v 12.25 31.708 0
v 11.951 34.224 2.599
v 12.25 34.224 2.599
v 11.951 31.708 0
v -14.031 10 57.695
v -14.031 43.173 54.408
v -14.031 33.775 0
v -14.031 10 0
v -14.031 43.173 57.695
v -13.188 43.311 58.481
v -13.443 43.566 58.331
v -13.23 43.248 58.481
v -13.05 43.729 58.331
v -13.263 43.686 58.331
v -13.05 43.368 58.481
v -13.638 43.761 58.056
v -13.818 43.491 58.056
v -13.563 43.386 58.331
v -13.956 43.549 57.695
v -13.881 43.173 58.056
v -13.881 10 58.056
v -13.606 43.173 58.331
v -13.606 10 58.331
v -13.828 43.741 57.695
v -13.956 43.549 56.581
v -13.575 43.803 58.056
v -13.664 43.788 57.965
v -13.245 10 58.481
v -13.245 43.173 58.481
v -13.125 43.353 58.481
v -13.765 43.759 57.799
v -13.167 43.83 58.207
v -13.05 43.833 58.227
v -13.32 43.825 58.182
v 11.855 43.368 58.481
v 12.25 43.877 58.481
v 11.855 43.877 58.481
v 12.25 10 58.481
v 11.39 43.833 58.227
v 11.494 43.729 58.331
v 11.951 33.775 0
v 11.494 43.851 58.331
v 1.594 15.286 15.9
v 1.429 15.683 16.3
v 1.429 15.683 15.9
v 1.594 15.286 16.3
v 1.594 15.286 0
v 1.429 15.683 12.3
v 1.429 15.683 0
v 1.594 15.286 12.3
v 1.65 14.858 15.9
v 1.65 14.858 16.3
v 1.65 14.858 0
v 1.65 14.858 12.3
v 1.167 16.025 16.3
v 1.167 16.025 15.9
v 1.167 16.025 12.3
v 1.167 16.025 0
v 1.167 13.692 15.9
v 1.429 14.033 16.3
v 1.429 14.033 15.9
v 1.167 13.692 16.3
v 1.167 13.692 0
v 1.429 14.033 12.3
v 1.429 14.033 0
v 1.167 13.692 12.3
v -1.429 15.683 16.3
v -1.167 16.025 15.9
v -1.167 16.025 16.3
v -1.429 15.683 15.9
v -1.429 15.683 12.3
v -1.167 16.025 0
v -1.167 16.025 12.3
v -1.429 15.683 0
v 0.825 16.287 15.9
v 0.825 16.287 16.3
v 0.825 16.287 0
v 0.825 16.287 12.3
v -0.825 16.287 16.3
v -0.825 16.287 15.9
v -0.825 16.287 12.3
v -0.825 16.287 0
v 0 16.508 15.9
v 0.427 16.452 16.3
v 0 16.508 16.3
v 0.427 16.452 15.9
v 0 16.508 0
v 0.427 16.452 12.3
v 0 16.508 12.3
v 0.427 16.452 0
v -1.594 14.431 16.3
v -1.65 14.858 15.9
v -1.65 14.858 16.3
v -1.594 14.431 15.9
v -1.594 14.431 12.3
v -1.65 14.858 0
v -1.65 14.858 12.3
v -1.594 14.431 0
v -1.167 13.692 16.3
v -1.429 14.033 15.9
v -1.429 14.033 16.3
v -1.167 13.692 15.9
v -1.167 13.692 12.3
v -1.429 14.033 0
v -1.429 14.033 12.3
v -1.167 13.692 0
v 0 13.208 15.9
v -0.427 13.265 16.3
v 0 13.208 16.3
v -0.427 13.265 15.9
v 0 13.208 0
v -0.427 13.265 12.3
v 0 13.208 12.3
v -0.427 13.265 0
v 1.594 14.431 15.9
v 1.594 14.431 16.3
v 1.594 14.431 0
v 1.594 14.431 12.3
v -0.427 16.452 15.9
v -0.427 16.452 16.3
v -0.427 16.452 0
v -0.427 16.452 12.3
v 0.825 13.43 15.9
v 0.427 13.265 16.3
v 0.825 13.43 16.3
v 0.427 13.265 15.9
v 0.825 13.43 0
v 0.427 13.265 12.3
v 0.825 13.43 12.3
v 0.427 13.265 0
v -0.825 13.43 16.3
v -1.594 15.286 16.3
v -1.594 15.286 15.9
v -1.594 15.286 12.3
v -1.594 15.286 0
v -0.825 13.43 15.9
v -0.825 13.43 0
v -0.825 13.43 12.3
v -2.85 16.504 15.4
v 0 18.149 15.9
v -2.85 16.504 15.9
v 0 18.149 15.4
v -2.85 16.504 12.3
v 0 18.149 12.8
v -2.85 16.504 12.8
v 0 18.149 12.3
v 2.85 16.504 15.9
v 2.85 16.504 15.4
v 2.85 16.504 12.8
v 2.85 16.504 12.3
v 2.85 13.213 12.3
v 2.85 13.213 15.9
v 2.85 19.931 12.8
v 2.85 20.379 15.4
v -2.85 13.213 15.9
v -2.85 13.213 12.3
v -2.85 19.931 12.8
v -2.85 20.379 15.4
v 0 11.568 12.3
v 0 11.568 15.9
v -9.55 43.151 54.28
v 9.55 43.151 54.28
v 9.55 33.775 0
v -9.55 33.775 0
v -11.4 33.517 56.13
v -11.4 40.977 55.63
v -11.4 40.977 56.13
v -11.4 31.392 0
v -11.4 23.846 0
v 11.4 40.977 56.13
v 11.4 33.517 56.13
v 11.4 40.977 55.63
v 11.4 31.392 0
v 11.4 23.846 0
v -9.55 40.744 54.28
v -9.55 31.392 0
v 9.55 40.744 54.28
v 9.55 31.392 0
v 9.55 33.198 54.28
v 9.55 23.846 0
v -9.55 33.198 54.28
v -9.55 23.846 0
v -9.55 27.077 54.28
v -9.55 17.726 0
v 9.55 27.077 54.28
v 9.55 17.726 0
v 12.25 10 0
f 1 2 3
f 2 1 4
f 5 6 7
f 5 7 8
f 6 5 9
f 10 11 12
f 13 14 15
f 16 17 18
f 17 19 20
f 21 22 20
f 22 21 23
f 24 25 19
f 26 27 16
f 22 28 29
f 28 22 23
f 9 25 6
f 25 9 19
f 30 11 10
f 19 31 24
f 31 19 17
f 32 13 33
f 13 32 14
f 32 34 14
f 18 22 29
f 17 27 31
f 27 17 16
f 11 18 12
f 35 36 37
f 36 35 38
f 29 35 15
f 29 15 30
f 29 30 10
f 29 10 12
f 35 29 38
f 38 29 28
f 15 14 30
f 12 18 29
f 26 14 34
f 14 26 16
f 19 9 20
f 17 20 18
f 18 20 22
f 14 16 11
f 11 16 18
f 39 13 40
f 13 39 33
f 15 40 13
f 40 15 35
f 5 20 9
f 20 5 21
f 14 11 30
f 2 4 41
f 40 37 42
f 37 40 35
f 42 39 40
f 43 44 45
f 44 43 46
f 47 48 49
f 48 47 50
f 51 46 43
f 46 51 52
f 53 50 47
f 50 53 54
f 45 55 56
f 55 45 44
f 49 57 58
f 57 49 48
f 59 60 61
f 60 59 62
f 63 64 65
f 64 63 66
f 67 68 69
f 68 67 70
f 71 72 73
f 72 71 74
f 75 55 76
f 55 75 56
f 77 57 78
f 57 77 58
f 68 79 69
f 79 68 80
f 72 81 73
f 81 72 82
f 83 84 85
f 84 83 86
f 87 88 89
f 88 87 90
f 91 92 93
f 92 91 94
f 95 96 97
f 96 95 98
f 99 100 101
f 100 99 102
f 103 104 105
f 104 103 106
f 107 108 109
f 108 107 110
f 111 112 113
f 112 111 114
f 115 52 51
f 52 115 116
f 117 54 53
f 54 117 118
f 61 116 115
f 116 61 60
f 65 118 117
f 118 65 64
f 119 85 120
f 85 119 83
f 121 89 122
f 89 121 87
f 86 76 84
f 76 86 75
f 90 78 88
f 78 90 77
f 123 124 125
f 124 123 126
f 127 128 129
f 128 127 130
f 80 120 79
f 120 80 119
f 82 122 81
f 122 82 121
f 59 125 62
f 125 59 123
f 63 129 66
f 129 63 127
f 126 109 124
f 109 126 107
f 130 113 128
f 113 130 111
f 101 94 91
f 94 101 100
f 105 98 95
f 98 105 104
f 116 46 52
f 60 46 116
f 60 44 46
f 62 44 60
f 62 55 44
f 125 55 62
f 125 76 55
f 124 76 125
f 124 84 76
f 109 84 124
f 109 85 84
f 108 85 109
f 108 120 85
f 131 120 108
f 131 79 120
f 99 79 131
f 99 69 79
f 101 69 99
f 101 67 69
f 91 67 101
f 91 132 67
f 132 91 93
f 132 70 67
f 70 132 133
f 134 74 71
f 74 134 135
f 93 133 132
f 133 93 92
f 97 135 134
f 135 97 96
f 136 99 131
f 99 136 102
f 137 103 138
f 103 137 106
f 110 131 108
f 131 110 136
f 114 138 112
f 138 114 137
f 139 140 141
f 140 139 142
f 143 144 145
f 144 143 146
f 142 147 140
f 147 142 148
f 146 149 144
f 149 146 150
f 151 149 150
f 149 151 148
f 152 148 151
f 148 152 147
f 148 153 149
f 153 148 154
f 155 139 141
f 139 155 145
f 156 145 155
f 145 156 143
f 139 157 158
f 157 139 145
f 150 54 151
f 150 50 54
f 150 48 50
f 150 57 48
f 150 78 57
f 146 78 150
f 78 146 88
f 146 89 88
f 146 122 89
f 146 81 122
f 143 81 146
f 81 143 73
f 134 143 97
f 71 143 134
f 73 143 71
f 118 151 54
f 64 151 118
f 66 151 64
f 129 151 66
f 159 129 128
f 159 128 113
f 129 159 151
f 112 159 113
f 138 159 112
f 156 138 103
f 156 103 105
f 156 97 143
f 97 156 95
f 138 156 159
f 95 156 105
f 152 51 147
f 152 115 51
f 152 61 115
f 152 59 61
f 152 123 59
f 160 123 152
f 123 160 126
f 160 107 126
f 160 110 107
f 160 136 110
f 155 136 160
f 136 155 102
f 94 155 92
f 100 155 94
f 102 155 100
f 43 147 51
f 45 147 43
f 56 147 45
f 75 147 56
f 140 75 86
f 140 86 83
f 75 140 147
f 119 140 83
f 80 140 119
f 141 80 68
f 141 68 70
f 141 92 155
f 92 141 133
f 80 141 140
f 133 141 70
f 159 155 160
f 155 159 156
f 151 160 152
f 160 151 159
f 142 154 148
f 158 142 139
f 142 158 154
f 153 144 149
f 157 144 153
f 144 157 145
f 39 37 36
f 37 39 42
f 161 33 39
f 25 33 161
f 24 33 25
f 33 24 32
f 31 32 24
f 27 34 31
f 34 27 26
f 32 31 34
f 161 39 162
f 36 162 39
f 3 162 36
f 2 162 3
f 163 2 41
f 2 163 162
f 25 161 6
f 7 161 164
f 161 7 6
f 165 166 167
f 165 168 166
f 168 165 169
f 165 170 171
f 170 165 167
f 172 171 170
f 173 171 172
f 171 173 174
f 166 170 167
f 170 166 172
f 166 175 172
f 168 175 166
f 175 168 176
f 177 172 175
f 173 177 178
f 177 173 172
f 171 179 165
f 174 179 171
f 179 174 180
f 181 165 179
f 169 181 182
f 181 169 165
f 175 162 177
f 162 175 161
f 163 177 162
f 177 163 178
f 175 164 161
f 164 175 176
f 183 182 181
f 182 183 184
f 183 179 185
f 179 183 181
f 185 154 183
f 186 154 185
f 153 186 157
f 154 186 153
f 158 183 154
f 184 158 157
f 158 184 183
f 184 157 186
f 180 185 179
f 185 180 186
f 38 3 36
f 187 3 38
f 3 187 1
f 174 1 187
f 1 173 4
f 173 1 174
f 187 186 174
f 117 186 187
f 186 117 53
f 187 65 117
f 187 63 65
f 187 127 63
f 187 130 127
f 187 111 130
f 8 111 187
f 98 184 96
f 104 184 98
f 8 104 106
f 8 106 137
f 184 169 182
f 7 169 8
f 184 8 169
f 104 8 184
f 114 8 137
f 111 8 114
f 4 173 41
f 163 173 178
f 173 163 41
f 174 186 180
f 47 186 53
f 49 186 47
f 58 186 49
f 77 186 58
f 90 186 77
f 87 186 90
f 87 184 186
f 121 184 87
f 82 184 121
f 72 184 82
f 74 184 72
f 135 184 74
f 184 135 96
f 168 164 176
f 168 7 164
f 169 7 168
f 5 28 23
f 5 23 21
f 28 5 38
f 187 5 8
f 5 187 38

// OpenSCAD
// --- BUMPER BRACKET — TREAD CARRIAGE ---
// Sub-volume of the bumper bracket shell, carved out by tread_carriage_*_mm bounds
// in config.scad (absolute bracket X/Y/Z). Tune those variables to choose what
// stays in bumper-bracket.scad vs what prints as this carriage piece.
//
// Modeled in the bracket coordinate frame (same as bumper-bracket.scad).
// Standalone export rests the selection cube's −Z face on the build plate.

BUMPER_BRACKET_INCLUDED_BY = true;
include <bumper-bracket.scad>

$fn = preview ? 32 : 64;

tread_carriage_emit_if_root = is_undef(tread_carriage_suppress_root) ? true : !tread_carriage_suppress_root;

if (tread_carriage_emit_if_root)
    tread_carriage_export_bed_lift()
        tread_carriage();
